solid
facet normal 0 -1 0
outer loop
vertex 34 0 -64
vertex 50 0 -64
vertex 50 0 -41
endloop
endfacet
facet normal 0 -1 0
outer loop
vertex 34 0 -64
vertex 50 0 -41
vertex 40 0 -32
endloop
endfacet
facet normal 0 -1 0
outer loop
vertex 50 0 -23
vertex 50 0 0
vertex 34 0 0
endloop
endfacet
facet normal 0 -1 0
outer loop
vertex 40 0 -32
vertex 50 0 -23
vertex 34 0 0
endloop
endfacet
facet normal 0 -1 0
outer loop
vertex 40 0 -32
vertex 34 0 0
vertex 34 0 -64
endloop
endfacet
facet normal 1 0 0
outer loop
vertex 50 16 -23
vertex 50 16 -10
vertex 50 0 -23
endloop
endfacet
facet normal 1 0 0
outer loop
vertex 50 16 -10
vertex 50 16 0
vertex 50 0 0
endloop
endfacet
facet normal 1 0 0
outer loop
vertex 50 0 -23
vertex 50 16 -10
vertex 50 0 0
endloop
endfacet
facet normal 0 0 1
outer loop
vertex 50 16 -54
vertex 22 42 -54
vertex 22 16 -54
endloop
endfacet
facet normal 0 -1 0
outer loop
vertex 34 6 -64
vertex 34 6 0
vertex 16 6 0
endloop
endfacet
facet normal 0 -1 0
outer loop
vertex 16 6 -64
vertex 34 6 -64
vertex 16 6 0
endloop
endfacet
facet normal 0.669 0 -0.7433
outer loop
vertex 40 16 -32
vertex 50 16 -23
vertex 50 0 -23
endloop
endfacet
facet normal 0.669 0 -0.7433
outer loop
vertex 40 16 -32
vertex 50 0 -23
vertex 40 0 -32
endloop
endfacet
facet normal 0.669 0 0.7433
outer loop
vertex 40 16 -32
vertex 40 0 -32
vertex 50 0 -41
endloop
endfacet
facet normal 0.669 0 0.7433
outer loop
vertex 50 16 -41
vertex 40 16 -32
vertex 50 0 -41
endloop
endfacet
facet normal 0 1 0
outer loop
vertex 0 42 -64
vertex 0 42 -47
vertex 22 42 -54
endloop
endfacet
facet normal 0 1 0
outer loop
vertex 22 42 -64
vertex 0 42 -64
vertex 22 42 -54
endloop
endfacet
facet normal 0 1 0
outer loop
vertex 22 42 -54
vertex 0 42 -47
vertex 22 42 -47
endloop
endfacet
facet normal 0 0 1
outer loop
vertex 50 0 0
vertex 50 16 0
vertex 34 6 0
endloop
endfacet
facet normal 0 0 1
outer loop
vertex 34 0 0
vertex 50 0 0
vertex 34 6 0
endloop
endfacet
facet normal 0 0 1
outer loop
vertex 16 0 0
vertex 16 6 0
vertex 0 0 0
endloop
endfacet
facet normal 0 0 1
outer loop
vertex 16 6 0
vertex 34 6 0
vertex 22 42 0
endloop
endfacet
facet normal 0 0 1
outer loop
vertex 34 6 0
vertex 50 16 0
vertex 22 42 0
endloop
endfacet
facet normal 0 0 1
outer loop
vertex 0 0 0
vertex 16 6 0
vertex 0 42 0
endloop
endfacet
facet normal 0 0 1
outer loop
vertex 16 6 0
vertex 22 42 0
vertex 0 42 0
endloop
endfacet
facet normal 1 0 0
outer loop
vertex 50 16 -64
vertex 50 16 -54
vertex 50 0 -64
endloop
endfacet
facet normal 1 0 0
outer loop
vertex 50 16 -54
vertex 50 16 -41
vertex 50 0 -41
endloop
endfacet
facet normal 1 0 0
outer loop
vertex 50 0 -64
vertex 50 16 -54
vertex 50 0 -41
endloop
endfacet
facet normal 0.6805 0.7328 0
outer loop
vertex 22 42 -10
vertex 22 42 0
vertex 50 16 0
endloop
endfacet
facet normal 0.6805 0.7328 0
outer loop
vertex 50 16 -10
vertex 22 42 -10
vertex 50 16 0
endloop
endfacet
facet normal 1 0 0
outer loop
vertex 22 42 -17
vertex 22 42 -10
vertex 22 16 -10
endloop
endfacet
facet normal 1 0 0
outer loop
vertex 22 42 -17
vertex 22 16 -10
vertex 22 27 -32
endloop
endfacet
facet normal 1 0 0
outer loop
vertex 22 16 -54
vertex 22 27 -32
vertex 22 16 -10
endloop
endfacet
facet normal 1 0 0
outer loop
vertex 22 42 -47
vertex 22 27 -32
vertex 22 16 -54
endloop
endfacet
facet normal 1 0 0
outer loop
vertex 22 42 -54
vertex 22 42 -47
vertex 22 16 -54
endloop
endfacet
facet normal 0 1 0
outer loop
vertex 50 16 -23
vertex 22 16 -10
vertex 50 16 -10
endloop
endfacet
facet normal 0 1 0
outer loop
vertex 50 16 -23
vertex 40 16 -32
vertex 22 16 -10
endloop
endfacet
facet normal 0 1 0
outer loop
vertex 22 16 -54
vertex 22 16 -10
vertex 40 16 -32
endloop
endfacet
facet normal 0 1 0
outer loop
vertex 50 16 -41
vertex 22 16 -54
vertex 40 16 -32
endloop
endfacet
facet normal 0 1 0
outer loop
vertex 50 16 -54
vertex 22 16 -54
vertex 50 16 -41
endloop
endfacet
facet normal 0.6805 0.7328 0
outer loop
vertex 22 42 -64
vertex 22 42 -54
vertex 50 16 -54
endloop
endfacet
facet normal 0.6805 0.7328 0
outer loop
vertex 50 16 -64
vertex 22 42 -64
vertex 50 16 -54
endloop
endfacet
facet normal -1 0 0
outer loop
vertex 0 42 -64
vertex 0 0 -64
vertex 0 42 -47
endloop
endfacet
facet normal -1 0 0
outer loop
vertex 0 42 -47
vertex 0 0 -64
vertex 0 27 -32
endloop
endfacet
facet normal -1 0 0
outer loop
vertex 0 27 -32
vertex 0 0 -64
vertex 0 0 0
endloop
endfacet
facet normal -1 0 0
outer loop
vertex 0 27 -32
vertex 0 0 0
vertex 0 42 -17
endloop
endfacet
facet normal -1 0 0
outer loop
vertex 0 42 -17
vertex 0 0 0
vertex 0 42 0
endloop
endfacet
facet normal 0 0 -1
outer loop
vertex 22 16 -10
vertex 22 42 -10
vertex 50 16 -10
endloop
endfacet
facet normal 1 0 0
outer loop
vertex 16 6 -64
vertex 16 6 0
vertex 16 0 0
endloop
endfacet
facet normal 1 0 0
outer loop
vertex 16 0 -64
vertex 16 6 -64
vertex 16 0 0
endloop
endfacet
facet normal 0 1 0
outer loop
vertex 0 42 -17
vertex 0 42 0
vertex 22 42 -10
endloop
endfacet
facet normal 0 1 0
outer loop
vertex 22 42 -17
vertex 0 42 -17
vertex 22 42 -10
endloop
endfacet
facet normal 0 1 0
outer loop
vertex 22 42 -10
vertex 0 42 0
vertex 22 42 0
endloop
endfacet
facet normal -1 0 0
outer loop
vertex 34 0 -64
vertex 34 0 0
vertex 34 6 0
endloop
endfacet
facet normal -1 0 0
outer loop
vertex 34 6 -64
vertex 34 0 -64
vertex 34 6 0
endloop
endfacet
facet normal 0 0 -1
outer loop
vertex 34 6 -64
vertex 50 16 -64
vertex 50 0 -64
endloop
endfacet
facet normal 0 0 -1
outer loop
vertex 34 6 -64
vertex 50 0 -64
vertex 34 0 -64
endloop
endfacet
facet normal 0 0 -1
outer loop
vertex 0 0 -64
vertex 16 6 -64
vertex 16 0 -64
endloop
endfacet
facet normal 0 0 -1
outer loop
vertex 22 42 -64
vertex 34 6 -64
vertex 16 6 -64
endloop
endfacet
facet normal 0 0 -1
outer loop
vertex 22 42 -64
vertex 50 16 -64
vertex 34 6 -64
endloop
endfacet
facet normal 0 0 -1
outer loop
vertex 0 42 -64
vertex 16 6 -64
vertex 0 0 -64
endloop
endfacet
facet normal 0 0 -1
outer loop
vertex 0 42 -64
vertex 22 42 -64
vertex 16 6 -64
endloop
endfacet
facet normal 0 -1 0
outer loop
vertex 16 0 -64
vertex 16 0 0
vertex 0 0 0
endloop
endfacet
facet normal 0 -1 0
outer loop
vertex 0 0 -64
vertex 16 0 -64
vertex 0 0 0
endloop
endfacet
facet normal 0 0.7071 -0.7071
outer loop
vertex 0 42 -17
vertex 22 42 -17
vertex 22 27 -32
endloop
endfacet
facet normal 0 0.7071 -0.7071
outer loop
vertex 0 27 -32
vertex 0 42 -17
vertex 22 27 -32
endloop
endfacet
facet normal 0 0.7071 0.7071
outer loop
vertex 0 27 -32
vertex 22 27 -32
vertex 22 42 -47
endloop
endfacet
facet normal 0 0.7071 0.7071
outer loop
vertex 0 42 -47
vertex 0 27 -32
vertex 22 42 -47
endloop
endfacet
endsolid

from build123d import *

# Parameters (mm, degrees)
BOSS_EXTRUDE2_DEPTH = 64
SKETCH3_W           = 28
SKETCH3_H           = 44
CUT_EXTRUDE3_DEPTH  = 26
CUT_EXTRUDE4_DEPTH  = 82.510735489
CUT_EXTRUDE6_DEPTH  = 86.276022421


with BuildPart() as part:
    # Sketch1 → Boss-Extrude2 (new body)
    with BuildSketch(Plane.XY):
        Polygon((0, 0), (0, 42), (22, 42), (50, 16), (50, 0), (34, 0), (34, 6), (16, 6), (16, 0), align=None)
    extrude(amount=-BOSS_EXTRUDE2_DEPTH)

    # Sketch3 → Cut-Extrude3 (cut)
    with BuildSketch(Plane(origin=(0, 42, 0), x_dir=(1, 0, 0), z_dir=(0, 1, 0))):
        with Locations((36, 32)):
            Rectangle(SKETCH3_W, SKETCH3_H)
    extrude(amount=-CUT_EXTRUDE3_DEPTH, mode=Mode.SUBTRACT)

    # Sketch5 → Cut-Extrude4 (cut, through all)
    with BuildSketch(Plane(origin=(22, 0, 0), x_dir=(0, 0, -1), z_dir=(1, 0, 0))):
        Polygon((32, 27), (47, 42), (17, 42), align=None)
    extrude(amount=-CUT_EXTRUDE4_DEPTH, mode=Mode.SUBTRACT)

    # Sketch7 → Cut-Extrude6 (cut, through all)
    with BuildSketch(Plane(origin=(0, 16, 0), x_dir=(1, 0, 0), z_dir=(0, 1, 0))):
        Polygon((40, 32), (50, 41), (50, 23), align=None)
    extrude(amount=-CUT_EXTRUDE6_DEPTH, mode=Mode.SUBTRACT)


solid = part.part
